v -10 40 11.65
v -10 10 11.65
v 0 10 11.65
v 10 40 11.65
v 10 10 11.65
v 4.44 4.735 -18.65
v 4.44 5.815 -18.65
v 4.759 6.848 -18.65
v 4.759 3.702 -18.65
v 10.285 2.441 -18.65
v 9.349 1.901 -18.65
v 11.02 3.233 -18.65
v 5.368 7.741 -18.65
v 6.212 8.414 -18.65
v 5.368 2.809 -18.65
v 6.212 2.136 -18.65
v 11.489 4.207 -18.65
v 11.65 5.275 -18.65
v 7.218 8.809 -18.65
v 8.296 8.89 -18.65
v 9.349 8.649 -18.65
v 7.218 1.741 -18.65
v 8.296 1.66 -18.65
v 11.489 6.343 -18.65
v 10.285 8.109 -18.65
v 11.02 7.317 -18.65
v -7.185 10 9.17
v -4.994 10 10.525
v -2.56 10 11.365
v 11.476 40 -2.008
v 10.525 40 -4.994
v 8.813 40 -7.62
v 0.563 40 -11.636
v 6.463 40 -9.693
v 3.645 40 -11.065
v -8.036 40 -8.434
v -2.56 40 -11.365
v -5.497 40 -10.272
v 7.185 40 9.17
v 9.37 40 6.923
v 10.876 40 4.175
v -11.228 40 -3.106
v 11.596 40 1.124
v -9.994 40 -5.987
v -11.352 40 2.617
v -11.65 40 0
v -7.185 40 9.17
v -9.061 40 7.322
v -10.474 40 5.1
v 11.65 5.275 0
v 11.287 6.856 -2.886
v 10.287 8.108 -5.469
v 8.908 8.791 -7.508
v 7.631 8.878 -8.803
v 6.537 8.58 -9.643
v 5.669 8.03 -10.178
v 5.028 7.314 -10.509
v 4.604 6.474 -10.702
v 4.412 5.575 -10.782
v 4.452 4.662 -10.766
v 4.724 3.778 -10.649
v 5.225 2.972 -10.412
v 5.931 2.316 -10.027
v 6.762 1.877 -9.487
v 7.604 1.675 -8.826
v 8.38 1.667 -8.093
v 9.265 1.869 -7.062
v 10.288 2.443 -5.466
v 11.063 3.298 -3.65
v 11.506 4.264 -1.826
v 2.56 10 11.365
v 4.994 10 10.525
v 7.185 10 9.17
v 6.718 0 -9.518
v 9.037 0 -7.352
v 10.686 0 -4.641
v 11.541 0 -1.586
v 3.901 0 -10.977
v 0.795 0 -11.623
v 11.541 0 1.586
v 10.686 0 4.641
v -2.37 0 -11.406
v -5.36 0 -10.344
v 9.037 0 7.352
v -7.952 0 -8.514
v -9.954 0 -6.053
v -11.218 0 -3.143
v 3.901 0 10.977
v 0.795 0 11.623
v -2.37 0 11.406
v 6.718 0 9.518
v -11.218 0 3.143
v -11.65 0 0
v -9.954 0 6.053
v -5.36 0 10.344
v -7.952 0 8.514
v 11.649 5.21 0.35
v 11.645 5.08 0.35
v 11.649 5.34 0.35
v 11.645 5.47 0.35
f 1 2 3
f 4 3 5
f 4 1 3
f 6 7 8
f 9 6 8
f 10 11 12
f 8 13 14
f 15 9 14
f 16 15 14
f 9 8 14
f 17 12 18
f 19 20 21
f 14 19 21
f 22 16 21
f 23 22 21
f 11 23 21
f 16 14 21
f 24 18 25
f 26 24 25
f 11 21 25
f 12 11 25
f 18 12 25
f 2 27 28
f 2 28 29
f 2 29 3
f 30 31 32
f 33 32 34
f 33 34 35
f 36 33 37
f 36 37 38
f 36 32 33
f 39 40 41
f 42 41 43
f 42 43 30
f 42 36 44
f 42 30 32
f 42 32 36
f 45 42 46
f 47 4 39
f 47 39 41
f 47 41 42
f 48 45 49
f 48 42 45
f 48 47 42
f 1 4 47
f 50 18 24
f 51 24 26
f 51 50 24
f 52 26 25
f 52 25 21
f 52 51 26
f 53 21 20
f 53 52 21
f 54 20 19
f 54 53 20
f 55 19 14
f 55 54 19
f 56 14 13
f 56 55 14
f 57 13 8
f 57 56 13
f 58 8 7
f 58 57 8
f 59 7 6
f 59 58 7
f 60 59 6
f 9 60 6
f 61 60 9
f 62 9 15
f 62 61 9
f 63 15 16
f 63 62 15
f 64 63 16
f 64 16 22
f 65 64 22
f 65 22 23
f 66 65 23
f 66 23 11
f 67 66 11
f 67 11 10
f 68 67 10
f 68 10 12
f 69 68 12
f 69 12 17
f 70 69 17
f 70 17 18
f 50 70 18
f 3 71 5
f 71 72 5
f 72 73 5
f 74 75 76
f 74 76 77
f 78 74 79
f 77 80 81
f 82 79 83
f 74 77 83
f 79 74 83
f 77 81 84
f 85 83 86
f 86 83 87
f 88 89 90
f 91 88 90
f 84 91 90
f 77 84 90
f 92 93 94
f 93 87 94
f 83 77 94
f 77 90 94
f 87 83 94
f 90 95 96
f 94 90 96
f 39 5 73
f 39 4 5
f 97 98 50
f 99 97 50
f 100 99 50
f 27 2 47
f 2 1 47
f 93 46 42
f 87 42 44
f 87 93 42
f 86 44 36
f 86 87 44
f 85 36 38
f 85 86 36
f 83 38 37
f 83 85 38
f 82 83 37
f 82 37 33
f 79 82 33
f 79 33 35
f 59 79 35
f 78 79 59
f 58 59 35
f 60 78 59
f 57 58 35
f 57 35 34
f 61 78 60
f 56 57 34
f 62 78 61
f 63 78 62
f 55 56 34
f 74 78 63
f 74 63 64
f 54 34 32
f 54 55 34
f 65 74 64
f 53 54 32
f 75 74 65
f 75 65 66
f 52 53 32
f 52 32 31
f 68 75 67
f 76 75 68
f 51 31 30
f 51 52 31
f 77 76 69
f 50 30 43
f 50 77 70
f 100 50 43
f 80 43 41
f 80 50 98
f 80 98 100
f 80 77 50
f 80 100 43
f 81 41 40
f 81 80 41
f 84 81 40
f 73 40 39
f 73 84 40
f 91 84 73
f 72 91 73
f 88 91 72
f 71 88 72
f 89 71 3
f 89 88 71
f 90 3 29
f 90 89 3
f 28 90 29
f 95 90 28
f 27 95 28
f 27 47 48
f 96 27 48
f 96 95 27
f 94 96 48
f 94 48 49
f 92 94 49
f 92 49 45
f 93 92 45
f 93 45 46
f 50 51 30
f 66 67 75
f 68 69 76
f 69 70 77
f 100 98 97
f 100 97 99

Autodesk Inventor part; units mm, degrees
ref_plane "YZ Plane" through (0, 0, 0) normal (1, 0, 0) x (0, 1, 0)
ref_plane "XZ Plane" through (0, 0, 0) normal (0, 1, 0) x (-1, 0, 0)
sketch "Szkic1" plane through (0, 0, 0) normal (0, 1, 0) x (-1, 0, 0)
  circle A0 centre (0, 0) radius 11.65
  dimension "d0" = 23.3
extrude "Wyciągnięcie proste1" add sketch "Szkic1" along normal blind 40
sketch "Szkic2" plane through (0, 40, 0) normal (0, 1, 0) x (1, 0, 0)
  circle A0 centre (0, 0) radius 11.65 projected
  line L0 (0, -11.65) -> (-10, -11.65)
  arc A1 (-7.185, -9.1705) -> (0, -11.65) centre (0, 0) ccw
  line L1 (0, -11.65) -> (-7.185, -11.65)
  line L2 (0, -9.1705) -> (-7.185, -9.1705)
  line L3 (0, -11.65) -> (0, -5.8216)
  line L4 (-10, -11.65) -> (-7.185, -9.1705)
  line L5 (0, -11.65) -> (10, -11.65)
  line L6 (0, -9.1705) -> (7.185, -9.1705)
  line L7 (10, -11.65) -> (7.185, -9.1705)
  dimension "d3" = 10
  dimension "d6" = 7.185
extrude "Wyciągnięcie proste2" add sketch "Szkic2" against normal blind 30 contours A0 L0 L4 | L7 L5 A0
ref_plane "Płaszczyzna konstrukcyjna1" through (0, 0, -11.65) normal (0, 0, 1) x (1, 0, 0)
sketch "Szkic3" plane through (0, 0, -11.65) normal (0, 0, 1) x (1, 0, 0)
  circle A0 centre (8.025, 5.275) radius 3.625
  line L0 (11.65, 0) -> (-11.65, 0) projected
  line L1 (11.65, 8.9) -> (-11.65, 8.9)
  circle A1 centre (8.025, 5.275) radius 2
  point P0 (0, 0)
  dimension "d10" = 8.9
  dimension "d11" = 4
extrude "Wyciągnięcie proste3" add sketch "Szkic3" along normal blind 12 and the other way blind 7 contours A0 | A1
properties part number "Pomp]"
